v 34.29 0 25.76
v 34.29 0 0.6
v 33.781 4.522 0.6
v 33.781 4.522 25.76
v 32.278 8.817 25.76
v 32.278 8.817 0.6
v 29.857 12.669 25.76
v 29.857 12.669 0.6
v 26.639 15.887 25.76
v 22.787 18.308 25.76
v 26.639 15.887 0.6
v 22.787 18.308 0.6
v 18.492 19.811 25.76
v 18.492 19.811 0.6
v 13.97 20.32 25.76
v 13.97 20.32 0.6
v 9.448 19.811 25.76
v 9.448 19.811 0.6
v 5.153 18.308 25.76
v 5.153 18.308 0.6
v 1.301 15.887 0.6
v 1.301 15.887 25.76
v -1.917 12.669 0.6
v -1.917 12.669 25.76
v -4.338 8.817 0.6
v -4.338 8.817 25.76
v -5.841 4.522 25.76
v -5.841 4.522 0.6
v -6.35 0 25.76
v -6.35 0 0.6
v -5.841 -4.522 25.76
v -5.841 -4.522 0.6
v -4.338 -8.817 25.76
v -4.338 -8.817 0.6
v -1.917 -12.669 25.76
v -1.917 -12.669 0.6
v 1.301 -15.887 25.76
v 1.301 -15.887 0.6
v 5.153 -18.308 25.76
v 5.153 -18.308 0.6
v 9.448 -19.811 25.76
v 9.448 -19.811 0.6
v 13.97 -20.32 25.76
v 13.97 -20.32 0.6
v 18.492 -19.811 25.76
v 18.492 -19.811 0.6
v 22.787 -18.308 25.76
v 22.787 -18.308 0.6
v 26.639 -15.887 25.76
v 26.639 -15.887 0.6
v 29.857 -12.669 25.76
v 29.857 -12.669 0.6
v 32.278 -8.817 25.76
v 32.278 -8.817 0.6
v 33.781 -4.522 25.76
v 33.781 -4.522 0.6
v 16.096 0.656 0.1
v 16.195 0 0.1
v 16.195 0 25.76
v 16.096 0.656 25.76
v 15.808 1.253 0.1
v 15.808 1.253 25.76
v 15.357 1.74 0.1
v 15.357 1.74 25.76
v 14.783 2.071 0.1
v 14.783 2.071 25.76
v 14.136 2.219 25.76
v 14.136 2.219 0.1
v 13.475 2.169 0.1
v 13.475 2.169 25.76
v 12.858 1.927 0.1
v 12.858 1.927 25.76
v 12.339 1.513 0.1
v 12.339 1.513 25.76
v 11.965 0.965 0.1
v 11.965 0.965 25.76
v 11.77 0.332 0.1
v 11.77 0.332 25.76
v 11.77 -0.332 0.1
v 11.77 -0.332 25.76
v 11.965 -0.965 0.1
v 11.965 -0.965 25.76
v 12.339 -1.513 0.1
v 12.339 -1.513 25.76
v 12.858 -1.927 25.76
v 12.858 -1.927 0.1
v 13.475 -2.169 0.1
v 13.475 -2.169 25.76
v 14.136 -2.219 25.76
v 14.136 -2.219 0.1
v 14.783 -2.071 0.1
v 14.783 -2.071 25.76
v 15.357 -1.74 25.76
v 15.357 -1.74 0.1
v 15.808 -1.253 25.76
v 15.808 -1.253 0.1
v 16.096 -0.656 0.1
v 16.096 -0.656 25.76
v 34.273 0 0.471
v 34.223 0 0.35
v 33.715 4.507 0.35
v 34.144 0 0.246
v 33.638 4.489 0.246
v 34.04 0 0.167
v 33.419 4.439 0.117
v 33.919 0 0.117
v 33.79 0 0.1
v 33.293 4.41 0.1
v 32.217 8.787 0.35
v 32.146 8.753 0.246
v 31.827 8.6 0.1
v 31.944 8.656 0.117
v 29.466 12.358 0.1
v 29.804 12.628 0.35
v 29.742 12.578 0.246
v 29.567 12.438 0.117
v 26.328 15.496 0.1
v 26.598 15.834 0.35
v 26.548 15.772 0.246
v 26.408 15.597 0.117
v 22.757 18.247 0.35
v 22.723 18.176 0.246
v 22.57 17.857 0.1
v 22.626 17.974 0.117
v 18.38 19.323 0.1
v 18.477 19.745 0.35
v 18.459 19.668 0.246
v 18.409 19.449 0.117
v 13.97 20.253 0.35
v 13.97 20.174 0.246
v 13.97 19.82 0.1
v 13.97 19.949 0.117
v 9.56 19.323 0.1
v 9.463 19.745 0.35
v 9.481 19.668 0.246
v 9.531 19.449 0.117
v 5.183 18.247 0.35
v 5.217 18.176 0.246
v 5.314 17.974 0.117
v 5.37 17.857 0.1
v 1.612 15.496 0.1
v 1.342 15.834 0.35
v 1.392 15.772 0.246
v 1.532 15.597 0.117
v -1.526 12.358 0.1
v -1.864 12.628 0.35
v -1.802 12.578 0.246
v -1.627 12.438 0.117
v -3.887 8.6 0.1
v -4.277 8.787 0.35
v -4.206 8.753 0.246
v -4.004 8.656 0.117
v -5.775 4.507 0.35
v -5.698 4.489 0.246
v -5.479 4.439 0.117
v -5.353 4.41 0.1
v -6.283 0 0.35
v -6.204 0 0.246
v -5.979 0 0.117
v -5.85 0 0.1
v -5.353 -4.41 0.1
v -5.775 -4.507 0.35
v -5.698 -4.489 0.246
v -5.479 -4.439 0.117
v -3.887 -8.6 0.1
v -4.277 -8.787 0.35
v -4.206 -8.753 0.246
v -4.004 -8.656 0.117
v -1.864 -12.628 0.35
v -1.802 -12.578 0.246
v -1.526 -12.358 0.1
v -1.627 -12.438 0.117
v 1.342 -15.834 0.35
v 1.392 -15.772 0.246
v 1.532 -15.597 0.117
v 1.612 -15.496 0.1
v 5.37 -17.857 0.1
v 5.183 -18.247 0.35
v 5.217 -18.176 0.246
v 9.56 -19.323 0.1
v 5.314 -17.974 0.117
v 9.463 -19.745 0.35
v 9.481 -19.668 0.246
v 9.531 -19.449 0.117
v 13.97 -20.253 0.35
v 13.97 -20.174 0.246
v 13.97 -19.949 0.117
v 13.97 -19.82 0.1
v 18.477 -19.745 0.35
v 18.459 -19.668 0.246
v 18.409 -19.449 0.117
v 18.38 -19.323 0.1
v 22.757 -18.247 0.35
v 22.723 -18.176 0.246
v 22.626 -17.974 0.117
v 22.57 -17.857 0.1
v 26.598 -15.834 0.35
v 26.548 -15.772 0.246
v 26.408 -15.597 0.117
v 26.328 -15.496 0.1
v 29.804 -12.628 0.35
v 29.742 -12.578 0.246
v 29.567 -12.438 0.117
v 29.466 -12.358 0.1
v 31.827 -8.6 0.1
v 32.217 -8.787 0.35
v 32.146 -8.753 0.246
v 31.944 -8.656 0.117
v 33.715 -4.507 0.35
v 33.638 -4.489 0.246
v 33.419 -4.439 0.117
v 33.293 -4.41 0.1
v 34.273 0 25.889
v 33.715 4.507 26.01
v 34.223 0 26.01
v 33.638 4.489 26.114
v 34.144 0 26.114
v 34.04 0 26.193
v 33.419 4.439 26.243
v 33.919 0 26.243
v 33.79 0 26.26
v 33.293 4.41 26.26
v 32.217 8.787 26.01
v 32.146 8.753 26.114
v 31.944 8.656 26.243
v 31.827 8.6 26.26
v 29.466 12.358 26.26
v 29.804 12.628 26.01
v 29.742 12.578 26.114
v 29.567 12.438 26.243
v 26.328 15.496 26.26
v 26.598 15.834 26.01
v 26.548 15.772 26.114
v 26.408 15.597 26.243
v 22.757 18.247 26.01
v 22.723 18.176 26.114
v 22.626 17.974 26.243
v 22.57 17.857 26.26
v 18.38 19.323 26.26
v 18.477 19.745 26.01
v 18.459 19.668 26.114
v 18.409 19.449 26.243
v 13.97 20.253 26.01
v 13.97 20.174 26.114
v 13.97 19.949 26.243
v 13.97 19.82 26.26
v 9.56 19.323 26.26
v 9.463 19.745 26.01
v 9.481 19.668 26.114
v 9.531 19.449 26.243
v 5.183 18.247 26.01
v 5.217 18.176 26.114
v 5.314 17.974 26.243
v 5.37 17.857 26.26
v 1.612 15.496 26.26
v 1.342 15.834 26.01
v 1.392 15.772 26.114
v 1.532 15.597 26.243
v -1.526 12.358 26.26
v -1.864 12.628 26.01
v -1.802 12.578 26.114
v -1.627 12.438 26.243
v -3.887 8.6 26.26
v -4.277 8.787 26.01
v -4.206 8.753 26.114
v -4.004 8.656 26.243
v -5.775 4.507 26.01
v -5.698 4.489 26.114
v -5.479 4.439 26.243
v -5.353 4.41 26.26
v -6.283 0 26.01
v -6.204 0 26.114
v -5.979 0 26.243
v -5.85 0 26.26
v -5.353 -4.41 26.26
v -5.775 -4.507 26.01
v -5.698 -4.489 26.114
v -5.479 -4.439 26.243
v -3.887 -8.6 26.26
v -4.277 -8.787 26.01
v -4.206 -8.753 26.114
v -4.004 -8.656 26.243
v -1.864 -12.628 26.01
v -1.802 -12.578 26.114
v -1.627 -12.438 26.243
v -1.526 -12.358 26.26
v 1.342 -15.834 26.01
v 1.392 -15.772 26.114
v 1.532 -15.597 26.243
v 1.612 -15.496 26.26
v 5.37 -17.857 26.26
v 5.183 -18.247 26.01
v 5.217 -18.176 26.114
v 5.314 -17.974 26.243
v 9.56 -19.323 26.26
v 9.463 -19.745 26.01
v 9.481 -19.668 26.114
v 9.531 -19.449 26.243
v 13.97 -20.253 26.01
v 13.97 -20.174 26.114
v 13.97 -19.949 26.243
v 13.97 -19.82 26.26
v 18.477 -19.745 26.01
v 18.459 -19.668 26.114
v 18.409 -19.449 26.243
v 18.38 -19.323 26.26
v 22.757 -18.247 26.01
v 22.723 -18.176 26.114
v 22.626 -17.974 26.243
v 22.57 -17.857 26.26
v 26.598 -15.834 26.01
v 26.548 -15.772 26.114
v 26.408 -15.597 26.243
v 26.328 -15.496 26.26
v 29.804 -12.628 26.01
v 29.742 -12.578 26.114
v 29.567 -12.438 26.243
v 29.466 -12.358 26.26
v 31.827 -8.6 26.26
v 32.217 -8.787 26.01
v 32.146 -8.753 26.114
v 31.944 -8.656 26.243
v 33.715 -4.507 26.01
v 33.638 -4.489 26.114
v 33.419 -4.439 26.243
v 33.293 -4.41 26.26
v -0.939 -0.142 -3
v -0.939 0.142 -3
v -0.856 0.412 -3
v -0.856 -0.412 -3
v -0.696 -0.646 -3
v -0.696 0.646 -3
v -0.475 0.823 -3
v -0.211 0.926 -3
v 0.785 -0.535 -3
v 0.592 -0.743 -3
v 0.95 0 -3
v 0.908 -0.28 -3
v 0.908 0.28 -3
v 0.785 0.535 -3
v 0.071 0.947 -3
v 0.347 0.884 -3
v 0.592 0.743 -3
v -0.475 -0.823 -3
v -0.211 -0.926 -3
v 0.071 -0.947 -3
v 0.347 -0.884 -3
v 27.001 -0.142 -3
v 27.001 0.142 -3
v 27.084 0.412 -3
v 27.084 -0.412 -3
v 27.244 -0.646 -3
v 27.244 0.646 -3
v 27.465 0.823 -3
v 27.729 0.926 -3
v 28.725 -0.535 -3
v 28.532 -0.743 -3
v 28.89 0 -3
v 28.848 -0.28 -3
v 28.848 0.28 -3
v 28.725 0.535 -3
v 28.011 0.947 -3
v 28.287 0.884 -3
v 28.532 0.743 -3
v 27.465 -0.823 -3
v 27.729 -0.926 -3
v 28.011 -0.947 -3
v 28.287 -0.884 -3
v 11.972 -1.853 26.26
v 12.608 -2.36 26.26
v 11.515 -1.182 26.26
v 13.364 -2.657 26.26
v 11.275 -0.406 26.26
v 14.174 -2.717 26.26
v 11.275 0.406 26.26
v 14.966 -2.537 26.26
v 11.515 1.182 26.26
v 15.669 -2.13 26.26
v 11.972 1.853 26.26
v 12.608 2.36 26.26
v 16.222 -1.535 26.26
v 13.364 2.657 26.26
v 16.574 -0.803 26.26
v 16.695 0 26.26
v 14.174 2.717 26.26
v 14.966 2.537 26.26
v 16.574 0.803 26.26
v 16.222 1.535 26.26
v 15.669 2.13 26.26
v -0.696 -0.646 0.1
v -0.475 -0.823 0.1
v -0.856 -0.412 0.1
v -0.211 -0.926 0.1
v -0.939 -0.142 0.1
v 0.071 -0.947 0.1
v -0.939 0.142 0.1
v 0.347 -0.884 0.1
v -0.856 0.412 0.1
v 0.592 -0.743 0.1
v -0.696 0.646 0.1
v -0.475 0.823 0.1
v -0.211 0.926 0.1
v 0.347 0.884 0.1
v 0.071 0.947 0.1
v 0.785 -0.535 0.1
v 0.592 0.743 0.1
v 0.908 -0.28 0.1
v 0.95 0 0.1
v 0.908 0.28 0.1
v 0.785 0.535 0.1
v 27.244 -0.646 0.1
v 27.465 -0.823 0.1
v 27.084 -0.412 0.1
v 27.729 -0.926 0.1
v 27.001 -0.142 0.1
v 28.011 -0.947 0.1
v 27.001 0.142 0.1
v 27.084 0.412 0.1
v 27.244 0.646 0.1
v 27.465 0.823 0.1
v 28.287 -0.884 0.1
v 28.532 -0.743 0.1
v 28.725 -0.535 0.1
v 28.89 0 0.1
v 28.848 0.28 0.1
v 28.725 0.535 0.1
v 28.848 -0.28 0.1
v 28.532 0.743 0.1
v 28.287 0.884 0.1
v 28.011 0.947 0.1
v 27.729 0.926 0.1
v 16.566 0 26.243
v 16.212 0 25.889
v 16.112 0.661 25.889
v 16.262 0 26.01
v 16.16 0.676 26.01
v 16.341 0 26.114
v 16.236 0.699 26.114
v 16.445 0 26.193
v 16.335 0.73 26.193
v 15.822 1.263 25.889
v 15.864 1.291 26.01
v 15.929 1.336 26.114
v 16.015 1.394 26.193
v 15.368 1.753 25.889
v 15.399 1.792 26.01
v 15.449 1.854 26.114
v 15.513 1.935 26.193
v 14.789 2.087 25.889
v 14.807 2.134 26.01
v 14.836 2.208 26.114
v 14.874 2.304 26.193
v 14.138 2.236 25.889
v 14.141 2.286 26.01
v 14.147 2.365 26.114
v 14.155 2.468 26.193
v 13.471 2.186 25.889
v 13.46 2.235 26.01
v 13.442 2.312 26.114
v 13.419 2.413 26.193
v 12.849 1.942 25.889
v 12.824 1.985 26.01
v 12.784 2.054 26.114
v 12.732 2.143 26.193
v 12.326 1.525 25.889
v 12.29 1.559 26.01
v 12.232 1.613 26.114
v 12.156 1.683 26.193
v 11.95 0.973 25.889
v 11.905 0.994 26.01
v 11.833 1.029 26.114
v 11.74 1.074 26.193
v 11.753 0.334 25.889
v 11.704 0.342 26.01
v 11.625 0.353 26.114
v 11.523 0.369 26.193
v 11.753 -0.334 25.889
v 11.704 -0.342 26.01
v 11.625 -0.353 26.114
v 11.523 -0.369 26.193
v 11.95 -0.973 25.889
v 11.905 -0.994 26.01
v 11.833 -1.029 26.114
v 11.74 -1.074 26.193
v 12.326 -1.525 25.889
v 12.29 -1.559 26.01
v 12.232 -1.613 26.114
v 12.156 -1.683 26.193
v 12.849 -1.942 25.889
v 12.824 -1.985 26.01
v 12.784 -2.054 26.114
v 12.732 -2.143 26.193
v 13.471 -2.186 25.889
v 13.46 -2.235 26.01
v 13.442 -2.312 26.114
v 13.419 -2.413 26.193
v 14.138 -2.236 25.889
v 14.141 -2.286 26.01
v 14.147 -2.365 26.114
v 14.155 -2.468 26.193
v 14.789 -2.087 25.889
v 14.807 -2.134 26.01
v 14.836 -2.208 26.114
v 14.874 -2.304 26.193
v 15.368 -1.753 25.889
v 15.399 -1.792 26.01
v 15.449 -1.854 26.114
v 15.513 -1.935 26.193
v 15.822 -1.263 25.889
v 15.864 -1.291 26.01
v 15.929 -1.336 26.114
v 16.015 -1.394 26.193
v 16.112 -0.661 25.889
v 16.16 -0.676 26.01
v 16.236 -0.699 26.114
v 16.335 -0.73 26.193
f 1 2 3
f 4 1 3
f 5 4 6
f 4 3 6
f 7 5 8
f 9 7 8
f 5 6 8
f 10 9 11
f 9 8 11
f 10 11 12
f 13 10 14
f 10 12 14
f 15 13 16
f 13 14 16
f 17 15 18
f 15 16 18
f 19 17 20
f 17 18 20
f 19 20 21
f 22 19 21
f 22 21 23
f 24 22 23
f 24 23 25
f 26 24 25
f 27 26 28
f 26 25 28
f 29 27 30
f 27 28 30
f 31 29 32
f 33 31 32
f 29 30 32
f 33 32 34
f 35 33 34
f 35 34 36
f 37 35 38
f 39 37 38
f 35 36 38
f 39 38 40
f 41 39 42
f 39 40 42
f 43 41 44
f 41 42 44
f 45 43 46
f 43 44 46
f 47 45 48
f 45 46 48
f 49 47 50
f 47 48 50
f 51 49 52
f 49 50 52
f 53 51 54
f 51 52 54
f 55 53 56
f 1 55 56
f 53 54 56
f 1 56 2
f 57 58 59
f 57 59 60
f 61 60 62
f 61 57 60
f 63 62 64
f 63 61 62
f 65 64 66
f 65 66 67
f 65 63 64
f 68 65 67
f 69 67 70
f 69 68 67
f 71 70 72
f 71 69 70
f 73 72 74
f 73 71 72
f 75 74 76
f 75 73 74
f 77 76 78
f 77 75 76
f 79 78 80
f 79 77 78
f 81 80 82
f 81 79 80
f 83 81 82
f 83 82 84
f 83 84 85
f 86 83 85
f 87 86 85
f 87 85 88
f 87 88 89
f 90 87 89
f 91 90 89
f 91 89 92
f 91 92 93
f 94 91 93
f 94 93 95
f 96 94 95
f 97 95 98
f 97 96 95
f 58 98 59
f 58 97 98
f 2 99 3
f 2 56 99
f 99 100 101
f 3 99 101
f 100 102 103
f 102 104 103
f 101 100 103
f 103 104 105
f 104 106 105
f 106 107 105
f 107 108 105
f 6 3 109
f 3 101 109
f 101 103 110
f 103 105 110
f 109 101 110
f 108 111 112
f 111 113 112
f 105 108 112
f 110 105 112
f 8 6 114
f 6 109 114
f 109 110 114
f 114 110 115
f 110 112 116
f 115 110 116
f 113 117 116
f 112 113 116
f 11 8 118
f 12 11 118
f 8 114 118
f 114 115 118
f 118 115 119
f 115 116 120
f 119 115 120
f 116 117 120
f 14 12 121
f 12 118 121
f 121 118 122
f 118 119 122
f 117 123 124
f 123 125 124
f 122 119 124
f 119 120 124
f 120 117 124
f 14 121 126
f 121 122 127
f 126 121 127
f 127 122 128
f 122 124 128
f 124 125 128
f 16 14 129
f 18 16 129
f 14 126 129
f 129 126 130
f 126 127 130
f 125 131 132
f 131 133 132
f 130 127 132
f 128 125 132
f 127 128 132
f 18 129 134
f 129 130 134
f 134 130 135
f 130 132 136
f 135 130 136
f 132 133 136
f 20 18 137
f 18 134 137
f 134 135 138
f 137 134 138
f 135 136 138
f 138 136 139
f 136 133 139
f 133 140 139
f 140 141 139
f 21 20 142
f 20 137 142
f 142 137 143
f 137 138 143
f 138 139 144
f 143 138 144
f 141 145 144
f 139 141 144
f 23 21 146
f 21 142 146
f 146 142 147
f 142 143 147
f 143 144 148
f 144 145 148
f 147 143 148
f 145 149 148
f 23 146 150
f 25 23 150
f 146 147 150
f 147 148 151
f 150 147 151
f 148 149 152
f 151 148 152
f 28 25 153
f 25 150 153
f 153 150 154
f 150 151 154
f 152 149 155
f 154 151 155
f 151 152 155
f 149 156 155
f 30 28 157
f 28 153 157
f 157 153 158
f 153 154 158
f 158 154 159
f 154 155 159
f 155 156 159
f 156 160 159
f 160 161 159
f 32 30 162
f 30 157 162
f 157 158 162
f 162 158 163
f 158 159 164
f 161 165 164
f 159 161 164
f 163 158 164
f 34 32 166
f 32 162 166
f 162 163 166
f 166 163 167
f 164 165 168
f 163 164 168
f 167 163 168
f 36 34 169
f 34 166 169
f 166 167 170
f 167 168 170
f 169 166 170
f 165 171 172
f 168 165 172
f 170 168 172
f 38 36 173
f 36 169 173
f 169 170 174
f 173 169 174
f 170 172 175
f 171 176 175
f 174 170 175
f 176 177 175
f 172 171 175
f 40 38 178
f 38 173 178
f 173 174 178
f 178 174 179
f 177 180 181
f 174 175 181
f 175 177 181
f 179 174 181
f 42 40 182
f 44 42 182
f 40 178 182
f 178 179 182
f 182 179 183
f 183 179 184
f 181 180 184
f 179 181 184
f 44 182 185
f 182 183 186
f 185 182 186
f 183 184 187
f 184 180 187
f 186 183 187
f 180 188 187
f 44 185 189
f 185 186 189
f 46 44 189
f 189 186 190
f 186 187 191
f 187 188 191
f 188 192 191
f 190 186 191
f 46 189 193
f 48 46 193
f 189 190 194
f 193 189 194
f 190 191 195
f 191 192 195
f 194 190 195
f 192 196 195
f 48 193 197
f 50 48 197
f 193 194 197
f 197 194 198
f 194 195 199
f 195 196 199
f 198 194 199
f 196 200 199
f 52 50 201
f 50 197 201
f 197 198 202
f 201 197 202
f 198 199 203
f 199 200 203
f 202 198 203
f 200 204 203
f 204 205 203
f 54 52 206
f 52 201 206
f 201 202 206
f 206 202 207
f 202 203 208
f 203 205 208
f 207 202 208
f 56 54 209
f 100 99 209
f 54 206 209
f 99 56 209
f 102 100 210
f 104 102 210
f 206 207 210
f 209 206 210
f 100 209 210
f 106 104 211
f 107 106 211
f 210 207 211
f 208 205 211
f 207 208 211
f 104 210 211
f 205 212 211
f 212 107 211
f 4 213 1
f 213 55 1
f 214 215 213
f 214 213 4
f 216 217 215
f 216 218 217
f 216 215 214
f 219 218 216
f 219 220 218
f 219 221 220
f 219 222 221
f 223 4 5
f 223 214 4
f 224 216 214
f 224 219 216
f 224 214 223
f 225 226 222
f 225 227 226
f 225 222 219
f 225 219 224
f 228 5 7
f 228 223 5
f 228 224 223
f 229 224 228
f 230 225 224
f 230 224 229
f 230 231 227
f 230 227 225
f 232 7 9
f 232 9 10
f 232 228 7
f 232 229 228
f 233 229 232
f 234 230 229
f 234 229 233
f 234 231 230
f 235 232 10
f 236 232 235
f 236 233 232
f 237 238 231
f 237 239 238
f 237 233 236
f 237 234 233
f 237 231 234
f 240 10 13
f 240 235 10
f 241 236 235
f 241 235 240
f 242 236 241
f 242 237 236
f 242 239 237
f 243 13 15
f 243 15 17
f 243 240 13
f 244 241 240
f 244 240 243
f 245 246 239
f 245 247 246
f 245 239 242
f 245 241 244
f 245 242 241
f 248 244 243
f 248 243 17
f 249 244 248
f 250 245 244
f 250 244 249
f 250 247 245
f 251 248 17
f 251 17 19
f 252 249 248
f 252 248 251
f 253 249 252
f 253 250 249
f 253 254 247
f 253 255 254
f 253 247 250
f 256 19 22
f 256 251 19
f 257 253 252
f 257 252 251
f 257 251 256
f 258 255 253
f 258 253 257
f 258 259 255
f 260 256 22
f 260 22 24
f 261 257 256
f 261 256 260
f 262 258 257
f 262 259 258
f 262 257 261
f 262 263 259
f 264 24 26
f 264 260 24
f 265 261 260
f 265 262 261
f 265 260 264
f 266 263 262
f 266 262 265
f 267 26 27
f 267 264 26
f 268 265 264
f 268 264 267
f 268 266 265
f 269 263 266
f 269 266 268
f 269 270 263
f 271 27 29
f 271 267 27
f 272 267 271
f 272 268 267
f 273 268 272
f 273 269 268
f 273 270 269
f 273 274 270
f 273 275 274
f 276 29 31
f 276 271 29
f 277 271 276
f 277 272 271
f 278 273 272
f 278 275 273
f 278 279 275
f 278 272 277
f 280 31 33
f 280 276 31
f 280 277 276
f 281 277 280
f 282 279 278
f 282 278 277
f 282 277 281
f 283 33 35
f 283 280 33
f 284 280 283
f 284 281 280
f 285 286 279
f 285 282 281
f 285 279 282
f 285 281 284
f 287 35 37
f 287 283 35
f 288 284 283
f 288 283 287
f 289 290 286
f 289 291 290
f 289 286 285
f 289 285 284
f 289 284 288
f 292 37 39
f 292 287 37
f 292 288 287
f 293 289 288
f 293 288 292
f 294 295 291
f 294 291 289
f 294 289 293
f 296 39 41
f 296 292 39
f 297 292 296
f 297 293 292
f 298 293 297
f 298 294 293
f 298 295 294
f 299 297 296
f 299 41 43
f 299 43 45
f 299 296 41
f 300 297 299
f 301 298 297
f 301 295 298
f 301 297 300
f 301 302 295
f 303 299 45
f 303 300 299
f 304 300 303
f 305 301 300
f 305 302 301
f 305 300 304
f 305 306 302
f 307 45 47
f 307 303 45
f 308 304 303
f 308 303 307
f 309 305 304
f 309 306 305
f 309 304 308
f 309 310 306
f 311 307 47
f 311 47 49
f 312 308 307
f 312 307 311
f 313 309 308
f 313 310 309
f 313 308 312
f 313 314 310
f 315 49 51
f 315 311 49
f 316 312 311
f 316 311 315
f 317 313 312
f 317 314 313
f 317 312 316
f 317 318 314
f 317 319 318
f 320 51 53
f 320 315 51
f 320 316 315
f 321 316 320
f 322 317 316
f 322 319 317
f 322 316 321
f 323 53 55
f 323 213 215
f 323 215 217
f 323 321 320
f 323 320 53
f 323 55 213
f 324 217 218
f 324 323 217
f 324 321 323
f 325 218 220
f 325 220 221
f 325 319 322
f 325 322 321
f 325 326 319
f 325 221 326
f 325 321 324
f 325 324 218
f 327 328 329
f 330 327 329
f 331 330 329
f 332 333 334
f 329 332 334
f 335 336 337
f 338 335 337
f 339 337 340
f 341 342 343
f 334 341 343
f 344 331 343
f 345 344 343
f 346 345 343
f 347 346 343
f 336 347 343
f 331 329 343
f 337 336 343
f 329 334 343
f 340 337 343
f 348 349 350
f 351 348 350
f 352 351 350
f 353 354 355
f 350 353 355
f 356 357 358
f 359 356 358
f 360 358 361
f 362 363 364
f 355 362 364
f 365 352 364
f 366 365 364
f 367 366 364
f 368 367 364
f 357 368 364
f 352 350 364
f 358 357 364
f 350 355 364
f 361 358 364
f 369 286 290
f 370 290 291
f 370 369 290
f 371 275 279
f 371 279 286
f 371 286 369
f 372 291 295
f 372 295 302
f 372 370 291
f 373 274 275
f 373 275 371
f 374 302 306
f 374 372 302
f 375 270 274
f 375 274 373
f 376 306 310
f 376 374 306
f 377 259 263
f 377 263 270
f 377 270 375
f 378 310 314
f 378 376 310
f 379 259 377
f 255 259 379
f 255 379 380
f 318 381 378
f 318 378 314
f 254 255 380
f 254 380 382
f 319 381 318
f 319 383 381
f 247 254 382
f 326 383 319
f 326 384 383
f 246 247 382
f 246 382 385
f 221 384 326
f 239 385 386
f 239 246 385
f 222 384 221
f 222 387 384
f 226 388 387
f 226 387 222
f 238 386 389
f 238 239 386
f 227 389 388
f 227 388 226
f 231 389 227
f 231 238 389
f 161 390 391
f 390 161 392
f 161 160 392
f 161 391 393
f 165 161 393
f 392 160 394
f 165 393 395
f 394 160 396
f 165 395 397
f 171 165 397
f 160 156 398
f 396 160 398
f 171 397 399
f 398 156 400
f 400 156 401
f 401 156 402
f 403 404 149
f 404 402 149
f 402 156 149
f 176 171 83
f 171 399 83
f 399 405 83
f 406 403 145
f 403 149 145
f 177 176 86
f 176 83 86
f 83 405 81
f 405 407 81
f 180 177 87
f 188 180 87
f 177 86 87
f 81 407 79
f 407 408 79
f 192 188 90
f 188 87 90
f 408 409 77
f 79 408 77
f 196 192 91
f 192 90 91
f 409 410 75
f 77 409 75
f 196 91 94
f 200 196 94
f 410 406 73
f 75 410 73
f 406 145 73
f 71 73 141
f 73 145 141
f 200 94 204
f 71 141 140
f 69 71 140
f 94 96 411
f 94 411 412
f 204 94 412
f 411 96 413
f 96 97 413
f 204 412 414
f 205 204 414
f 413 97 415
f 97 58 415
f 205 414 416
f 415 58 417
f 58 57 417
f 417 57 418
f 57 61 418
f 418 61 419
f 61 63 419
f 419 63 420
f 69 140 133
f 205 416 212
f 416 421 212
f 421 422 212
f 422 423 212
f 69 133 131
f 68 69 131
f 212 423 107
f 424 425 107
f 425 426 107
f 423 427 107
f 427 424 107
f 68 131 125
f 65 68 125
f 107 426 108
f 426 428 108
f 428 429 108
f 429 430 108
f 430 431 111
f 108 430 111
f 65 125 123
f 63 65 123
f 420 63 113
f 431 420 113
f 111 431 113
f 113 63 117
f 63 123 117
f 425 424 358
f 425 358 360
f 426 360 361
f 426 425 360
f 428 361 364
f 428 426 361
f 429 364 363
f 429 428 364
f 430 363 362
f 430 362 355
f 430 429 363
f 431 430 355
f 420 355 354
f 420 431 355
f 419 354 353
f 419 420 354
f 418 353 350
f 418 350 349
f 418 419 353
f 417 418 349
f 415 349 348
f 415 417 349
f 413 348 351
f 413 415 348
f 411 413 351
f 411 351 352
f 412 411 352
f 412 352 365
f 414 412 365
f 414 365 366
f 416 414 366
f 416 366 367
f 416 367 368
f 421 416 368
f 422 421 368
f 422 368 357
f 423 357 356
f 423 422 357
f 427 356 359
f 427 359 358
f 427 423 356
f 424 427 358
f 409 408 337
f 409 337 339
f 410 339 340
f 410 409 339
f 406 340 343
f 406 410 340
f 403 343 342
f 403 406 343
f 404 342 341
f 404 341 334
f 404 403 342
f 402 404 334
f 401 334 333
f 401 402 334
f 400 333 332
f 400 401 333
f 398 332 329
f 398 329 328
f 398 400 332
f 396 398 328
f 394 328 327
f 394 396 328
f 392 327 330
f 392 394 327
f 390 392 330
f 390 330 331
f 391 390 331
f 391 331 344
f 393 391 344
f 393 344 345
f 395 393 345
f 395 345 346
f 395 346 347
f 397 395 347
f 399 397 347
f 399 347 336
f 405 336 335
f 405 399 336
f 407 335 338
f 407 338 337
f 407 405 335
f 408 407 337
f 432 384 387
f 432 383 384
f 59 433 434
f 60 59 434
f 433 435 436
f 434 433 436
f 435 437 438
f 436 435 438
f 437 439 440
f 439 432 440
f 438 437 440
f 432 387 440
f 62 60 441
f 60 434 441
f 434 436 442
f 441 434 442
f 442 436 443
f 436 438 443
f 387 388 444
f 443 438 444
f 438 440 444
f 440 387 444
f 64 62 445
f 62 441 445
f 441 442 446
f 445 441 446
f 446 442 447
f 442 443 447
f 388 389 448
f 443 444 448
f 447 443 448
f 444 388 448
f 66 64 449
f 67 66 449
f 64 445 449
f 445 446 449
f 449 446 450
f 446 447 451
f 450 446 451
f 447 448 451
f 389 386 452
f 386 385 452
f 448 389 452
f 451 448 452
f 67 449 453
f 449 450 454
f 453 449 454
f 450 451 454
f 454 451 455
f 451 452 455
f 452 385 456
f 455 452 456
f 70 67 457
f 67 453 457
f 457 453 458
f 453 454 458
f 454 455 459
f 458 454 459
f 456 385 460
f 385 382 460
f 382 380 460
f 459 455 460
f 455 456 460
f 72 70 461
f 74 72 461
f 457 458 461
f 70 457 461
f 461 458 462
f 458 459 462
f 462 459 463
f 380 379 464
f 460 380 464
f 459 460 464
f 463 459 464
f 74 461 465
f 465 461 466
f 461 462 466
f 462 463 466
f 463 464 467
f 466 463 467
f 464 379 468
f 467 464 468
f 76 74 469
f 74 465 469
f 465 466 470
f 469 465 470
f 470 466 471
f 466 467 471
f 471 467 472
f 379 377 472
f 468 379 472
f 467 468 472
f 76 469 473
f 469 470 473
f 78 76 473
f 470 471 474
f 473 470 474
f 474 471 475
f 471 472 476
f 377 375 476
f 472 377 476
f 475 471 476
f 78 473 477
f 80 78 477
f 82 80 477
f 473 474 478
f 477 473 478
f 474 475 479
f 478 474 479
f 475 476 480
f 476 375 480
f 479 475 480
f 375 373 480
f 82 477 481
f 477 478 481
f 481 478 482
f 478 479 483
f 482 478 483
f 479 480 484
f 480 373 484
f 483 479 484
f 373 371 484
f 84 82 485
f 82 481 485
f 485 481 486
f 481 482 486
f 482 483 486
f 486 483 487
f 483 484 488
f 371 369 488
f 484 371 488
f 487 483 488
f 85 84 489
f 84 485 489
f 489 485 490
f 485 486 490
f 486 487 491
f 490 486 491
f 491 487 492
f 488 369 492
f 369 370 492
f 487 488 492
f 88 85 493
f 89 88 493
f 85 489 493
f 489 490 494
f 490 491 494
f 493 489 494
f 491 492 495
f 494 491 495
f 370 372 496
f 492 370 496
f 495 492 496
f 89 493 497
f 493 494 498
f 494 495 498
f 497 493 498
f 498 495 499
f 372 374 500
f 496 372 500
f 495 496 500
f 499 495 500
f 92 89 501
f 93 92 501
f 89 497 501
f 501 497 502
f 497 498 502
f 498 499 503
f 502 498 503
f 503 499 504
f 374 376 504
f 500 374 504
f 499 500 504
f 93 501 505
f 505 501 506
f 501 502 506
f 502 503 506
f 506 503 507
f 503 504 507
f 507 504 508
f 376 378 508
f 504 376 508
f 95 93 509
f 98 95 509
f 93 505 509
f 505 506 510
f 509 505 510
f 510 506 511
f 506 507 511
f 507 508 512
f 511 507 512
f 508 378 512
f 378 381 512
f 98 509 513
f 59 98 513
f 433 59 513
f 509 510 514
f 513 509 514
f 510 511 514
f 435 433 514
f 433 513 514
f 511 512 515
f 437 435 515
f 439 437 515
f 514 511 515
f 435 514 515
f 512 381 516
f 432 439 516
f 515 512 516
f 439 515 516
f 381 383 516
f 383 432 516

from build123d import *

# Parameters (mm, degrees)
SKETCH001_R       = 0.95
PAD001_DEPTH      = 13.08
PAD001_DEPTH_BACK = 3.5
SKETCH_R          = 20.32
SKETCH_R_2        = 2.225
PAD_DEPTH         = 26.16
FILLET_R          = 0.5


with BuildPart() as pad001:
    # Sketch001 → Pad001 (new body, two sides)
    with BuildSketch(Plane.XY.offset(0.5)) as pad001_sk:
        Circle(SKETCH001_R)
        with Locations((27.94, 0)):
            Circle(SKETCH001_R)
    extrude(amount=PAD001_DEPTH)
    extrude(pad001_sk.sketch, amount=-PAD001_DEPTH_BACK)


with BuildPart() as fillet_mp_cp:
    # Sketch → Pad (new body)
    with BuildSketch(Plane.XY.offset(0.1)):
        with Locations((13.97, 0)):
            Circle(SKETCH_R)
        with Locations((13.97, 0)):
            Circle(SKETCH_R_2, mode=Mode.SUBTRACT)
    extrude(amount=PAD_DEPTH)

    # Fillet
    fillet_edges = [fillet_mp_cp.edges().sort_by_distance(p)[0] for p in [
        (11.745, 0, 26.26),
        (-6.35, 0, 26.26),
        (-6.35, 0, 0.1),
    ]]
    fillet(fillet_edges, radius=FILLET_R)

    # Fillet_mp_cp: union Pad001
    add(pad001.part)


solid = fillet_mp_cp.part
